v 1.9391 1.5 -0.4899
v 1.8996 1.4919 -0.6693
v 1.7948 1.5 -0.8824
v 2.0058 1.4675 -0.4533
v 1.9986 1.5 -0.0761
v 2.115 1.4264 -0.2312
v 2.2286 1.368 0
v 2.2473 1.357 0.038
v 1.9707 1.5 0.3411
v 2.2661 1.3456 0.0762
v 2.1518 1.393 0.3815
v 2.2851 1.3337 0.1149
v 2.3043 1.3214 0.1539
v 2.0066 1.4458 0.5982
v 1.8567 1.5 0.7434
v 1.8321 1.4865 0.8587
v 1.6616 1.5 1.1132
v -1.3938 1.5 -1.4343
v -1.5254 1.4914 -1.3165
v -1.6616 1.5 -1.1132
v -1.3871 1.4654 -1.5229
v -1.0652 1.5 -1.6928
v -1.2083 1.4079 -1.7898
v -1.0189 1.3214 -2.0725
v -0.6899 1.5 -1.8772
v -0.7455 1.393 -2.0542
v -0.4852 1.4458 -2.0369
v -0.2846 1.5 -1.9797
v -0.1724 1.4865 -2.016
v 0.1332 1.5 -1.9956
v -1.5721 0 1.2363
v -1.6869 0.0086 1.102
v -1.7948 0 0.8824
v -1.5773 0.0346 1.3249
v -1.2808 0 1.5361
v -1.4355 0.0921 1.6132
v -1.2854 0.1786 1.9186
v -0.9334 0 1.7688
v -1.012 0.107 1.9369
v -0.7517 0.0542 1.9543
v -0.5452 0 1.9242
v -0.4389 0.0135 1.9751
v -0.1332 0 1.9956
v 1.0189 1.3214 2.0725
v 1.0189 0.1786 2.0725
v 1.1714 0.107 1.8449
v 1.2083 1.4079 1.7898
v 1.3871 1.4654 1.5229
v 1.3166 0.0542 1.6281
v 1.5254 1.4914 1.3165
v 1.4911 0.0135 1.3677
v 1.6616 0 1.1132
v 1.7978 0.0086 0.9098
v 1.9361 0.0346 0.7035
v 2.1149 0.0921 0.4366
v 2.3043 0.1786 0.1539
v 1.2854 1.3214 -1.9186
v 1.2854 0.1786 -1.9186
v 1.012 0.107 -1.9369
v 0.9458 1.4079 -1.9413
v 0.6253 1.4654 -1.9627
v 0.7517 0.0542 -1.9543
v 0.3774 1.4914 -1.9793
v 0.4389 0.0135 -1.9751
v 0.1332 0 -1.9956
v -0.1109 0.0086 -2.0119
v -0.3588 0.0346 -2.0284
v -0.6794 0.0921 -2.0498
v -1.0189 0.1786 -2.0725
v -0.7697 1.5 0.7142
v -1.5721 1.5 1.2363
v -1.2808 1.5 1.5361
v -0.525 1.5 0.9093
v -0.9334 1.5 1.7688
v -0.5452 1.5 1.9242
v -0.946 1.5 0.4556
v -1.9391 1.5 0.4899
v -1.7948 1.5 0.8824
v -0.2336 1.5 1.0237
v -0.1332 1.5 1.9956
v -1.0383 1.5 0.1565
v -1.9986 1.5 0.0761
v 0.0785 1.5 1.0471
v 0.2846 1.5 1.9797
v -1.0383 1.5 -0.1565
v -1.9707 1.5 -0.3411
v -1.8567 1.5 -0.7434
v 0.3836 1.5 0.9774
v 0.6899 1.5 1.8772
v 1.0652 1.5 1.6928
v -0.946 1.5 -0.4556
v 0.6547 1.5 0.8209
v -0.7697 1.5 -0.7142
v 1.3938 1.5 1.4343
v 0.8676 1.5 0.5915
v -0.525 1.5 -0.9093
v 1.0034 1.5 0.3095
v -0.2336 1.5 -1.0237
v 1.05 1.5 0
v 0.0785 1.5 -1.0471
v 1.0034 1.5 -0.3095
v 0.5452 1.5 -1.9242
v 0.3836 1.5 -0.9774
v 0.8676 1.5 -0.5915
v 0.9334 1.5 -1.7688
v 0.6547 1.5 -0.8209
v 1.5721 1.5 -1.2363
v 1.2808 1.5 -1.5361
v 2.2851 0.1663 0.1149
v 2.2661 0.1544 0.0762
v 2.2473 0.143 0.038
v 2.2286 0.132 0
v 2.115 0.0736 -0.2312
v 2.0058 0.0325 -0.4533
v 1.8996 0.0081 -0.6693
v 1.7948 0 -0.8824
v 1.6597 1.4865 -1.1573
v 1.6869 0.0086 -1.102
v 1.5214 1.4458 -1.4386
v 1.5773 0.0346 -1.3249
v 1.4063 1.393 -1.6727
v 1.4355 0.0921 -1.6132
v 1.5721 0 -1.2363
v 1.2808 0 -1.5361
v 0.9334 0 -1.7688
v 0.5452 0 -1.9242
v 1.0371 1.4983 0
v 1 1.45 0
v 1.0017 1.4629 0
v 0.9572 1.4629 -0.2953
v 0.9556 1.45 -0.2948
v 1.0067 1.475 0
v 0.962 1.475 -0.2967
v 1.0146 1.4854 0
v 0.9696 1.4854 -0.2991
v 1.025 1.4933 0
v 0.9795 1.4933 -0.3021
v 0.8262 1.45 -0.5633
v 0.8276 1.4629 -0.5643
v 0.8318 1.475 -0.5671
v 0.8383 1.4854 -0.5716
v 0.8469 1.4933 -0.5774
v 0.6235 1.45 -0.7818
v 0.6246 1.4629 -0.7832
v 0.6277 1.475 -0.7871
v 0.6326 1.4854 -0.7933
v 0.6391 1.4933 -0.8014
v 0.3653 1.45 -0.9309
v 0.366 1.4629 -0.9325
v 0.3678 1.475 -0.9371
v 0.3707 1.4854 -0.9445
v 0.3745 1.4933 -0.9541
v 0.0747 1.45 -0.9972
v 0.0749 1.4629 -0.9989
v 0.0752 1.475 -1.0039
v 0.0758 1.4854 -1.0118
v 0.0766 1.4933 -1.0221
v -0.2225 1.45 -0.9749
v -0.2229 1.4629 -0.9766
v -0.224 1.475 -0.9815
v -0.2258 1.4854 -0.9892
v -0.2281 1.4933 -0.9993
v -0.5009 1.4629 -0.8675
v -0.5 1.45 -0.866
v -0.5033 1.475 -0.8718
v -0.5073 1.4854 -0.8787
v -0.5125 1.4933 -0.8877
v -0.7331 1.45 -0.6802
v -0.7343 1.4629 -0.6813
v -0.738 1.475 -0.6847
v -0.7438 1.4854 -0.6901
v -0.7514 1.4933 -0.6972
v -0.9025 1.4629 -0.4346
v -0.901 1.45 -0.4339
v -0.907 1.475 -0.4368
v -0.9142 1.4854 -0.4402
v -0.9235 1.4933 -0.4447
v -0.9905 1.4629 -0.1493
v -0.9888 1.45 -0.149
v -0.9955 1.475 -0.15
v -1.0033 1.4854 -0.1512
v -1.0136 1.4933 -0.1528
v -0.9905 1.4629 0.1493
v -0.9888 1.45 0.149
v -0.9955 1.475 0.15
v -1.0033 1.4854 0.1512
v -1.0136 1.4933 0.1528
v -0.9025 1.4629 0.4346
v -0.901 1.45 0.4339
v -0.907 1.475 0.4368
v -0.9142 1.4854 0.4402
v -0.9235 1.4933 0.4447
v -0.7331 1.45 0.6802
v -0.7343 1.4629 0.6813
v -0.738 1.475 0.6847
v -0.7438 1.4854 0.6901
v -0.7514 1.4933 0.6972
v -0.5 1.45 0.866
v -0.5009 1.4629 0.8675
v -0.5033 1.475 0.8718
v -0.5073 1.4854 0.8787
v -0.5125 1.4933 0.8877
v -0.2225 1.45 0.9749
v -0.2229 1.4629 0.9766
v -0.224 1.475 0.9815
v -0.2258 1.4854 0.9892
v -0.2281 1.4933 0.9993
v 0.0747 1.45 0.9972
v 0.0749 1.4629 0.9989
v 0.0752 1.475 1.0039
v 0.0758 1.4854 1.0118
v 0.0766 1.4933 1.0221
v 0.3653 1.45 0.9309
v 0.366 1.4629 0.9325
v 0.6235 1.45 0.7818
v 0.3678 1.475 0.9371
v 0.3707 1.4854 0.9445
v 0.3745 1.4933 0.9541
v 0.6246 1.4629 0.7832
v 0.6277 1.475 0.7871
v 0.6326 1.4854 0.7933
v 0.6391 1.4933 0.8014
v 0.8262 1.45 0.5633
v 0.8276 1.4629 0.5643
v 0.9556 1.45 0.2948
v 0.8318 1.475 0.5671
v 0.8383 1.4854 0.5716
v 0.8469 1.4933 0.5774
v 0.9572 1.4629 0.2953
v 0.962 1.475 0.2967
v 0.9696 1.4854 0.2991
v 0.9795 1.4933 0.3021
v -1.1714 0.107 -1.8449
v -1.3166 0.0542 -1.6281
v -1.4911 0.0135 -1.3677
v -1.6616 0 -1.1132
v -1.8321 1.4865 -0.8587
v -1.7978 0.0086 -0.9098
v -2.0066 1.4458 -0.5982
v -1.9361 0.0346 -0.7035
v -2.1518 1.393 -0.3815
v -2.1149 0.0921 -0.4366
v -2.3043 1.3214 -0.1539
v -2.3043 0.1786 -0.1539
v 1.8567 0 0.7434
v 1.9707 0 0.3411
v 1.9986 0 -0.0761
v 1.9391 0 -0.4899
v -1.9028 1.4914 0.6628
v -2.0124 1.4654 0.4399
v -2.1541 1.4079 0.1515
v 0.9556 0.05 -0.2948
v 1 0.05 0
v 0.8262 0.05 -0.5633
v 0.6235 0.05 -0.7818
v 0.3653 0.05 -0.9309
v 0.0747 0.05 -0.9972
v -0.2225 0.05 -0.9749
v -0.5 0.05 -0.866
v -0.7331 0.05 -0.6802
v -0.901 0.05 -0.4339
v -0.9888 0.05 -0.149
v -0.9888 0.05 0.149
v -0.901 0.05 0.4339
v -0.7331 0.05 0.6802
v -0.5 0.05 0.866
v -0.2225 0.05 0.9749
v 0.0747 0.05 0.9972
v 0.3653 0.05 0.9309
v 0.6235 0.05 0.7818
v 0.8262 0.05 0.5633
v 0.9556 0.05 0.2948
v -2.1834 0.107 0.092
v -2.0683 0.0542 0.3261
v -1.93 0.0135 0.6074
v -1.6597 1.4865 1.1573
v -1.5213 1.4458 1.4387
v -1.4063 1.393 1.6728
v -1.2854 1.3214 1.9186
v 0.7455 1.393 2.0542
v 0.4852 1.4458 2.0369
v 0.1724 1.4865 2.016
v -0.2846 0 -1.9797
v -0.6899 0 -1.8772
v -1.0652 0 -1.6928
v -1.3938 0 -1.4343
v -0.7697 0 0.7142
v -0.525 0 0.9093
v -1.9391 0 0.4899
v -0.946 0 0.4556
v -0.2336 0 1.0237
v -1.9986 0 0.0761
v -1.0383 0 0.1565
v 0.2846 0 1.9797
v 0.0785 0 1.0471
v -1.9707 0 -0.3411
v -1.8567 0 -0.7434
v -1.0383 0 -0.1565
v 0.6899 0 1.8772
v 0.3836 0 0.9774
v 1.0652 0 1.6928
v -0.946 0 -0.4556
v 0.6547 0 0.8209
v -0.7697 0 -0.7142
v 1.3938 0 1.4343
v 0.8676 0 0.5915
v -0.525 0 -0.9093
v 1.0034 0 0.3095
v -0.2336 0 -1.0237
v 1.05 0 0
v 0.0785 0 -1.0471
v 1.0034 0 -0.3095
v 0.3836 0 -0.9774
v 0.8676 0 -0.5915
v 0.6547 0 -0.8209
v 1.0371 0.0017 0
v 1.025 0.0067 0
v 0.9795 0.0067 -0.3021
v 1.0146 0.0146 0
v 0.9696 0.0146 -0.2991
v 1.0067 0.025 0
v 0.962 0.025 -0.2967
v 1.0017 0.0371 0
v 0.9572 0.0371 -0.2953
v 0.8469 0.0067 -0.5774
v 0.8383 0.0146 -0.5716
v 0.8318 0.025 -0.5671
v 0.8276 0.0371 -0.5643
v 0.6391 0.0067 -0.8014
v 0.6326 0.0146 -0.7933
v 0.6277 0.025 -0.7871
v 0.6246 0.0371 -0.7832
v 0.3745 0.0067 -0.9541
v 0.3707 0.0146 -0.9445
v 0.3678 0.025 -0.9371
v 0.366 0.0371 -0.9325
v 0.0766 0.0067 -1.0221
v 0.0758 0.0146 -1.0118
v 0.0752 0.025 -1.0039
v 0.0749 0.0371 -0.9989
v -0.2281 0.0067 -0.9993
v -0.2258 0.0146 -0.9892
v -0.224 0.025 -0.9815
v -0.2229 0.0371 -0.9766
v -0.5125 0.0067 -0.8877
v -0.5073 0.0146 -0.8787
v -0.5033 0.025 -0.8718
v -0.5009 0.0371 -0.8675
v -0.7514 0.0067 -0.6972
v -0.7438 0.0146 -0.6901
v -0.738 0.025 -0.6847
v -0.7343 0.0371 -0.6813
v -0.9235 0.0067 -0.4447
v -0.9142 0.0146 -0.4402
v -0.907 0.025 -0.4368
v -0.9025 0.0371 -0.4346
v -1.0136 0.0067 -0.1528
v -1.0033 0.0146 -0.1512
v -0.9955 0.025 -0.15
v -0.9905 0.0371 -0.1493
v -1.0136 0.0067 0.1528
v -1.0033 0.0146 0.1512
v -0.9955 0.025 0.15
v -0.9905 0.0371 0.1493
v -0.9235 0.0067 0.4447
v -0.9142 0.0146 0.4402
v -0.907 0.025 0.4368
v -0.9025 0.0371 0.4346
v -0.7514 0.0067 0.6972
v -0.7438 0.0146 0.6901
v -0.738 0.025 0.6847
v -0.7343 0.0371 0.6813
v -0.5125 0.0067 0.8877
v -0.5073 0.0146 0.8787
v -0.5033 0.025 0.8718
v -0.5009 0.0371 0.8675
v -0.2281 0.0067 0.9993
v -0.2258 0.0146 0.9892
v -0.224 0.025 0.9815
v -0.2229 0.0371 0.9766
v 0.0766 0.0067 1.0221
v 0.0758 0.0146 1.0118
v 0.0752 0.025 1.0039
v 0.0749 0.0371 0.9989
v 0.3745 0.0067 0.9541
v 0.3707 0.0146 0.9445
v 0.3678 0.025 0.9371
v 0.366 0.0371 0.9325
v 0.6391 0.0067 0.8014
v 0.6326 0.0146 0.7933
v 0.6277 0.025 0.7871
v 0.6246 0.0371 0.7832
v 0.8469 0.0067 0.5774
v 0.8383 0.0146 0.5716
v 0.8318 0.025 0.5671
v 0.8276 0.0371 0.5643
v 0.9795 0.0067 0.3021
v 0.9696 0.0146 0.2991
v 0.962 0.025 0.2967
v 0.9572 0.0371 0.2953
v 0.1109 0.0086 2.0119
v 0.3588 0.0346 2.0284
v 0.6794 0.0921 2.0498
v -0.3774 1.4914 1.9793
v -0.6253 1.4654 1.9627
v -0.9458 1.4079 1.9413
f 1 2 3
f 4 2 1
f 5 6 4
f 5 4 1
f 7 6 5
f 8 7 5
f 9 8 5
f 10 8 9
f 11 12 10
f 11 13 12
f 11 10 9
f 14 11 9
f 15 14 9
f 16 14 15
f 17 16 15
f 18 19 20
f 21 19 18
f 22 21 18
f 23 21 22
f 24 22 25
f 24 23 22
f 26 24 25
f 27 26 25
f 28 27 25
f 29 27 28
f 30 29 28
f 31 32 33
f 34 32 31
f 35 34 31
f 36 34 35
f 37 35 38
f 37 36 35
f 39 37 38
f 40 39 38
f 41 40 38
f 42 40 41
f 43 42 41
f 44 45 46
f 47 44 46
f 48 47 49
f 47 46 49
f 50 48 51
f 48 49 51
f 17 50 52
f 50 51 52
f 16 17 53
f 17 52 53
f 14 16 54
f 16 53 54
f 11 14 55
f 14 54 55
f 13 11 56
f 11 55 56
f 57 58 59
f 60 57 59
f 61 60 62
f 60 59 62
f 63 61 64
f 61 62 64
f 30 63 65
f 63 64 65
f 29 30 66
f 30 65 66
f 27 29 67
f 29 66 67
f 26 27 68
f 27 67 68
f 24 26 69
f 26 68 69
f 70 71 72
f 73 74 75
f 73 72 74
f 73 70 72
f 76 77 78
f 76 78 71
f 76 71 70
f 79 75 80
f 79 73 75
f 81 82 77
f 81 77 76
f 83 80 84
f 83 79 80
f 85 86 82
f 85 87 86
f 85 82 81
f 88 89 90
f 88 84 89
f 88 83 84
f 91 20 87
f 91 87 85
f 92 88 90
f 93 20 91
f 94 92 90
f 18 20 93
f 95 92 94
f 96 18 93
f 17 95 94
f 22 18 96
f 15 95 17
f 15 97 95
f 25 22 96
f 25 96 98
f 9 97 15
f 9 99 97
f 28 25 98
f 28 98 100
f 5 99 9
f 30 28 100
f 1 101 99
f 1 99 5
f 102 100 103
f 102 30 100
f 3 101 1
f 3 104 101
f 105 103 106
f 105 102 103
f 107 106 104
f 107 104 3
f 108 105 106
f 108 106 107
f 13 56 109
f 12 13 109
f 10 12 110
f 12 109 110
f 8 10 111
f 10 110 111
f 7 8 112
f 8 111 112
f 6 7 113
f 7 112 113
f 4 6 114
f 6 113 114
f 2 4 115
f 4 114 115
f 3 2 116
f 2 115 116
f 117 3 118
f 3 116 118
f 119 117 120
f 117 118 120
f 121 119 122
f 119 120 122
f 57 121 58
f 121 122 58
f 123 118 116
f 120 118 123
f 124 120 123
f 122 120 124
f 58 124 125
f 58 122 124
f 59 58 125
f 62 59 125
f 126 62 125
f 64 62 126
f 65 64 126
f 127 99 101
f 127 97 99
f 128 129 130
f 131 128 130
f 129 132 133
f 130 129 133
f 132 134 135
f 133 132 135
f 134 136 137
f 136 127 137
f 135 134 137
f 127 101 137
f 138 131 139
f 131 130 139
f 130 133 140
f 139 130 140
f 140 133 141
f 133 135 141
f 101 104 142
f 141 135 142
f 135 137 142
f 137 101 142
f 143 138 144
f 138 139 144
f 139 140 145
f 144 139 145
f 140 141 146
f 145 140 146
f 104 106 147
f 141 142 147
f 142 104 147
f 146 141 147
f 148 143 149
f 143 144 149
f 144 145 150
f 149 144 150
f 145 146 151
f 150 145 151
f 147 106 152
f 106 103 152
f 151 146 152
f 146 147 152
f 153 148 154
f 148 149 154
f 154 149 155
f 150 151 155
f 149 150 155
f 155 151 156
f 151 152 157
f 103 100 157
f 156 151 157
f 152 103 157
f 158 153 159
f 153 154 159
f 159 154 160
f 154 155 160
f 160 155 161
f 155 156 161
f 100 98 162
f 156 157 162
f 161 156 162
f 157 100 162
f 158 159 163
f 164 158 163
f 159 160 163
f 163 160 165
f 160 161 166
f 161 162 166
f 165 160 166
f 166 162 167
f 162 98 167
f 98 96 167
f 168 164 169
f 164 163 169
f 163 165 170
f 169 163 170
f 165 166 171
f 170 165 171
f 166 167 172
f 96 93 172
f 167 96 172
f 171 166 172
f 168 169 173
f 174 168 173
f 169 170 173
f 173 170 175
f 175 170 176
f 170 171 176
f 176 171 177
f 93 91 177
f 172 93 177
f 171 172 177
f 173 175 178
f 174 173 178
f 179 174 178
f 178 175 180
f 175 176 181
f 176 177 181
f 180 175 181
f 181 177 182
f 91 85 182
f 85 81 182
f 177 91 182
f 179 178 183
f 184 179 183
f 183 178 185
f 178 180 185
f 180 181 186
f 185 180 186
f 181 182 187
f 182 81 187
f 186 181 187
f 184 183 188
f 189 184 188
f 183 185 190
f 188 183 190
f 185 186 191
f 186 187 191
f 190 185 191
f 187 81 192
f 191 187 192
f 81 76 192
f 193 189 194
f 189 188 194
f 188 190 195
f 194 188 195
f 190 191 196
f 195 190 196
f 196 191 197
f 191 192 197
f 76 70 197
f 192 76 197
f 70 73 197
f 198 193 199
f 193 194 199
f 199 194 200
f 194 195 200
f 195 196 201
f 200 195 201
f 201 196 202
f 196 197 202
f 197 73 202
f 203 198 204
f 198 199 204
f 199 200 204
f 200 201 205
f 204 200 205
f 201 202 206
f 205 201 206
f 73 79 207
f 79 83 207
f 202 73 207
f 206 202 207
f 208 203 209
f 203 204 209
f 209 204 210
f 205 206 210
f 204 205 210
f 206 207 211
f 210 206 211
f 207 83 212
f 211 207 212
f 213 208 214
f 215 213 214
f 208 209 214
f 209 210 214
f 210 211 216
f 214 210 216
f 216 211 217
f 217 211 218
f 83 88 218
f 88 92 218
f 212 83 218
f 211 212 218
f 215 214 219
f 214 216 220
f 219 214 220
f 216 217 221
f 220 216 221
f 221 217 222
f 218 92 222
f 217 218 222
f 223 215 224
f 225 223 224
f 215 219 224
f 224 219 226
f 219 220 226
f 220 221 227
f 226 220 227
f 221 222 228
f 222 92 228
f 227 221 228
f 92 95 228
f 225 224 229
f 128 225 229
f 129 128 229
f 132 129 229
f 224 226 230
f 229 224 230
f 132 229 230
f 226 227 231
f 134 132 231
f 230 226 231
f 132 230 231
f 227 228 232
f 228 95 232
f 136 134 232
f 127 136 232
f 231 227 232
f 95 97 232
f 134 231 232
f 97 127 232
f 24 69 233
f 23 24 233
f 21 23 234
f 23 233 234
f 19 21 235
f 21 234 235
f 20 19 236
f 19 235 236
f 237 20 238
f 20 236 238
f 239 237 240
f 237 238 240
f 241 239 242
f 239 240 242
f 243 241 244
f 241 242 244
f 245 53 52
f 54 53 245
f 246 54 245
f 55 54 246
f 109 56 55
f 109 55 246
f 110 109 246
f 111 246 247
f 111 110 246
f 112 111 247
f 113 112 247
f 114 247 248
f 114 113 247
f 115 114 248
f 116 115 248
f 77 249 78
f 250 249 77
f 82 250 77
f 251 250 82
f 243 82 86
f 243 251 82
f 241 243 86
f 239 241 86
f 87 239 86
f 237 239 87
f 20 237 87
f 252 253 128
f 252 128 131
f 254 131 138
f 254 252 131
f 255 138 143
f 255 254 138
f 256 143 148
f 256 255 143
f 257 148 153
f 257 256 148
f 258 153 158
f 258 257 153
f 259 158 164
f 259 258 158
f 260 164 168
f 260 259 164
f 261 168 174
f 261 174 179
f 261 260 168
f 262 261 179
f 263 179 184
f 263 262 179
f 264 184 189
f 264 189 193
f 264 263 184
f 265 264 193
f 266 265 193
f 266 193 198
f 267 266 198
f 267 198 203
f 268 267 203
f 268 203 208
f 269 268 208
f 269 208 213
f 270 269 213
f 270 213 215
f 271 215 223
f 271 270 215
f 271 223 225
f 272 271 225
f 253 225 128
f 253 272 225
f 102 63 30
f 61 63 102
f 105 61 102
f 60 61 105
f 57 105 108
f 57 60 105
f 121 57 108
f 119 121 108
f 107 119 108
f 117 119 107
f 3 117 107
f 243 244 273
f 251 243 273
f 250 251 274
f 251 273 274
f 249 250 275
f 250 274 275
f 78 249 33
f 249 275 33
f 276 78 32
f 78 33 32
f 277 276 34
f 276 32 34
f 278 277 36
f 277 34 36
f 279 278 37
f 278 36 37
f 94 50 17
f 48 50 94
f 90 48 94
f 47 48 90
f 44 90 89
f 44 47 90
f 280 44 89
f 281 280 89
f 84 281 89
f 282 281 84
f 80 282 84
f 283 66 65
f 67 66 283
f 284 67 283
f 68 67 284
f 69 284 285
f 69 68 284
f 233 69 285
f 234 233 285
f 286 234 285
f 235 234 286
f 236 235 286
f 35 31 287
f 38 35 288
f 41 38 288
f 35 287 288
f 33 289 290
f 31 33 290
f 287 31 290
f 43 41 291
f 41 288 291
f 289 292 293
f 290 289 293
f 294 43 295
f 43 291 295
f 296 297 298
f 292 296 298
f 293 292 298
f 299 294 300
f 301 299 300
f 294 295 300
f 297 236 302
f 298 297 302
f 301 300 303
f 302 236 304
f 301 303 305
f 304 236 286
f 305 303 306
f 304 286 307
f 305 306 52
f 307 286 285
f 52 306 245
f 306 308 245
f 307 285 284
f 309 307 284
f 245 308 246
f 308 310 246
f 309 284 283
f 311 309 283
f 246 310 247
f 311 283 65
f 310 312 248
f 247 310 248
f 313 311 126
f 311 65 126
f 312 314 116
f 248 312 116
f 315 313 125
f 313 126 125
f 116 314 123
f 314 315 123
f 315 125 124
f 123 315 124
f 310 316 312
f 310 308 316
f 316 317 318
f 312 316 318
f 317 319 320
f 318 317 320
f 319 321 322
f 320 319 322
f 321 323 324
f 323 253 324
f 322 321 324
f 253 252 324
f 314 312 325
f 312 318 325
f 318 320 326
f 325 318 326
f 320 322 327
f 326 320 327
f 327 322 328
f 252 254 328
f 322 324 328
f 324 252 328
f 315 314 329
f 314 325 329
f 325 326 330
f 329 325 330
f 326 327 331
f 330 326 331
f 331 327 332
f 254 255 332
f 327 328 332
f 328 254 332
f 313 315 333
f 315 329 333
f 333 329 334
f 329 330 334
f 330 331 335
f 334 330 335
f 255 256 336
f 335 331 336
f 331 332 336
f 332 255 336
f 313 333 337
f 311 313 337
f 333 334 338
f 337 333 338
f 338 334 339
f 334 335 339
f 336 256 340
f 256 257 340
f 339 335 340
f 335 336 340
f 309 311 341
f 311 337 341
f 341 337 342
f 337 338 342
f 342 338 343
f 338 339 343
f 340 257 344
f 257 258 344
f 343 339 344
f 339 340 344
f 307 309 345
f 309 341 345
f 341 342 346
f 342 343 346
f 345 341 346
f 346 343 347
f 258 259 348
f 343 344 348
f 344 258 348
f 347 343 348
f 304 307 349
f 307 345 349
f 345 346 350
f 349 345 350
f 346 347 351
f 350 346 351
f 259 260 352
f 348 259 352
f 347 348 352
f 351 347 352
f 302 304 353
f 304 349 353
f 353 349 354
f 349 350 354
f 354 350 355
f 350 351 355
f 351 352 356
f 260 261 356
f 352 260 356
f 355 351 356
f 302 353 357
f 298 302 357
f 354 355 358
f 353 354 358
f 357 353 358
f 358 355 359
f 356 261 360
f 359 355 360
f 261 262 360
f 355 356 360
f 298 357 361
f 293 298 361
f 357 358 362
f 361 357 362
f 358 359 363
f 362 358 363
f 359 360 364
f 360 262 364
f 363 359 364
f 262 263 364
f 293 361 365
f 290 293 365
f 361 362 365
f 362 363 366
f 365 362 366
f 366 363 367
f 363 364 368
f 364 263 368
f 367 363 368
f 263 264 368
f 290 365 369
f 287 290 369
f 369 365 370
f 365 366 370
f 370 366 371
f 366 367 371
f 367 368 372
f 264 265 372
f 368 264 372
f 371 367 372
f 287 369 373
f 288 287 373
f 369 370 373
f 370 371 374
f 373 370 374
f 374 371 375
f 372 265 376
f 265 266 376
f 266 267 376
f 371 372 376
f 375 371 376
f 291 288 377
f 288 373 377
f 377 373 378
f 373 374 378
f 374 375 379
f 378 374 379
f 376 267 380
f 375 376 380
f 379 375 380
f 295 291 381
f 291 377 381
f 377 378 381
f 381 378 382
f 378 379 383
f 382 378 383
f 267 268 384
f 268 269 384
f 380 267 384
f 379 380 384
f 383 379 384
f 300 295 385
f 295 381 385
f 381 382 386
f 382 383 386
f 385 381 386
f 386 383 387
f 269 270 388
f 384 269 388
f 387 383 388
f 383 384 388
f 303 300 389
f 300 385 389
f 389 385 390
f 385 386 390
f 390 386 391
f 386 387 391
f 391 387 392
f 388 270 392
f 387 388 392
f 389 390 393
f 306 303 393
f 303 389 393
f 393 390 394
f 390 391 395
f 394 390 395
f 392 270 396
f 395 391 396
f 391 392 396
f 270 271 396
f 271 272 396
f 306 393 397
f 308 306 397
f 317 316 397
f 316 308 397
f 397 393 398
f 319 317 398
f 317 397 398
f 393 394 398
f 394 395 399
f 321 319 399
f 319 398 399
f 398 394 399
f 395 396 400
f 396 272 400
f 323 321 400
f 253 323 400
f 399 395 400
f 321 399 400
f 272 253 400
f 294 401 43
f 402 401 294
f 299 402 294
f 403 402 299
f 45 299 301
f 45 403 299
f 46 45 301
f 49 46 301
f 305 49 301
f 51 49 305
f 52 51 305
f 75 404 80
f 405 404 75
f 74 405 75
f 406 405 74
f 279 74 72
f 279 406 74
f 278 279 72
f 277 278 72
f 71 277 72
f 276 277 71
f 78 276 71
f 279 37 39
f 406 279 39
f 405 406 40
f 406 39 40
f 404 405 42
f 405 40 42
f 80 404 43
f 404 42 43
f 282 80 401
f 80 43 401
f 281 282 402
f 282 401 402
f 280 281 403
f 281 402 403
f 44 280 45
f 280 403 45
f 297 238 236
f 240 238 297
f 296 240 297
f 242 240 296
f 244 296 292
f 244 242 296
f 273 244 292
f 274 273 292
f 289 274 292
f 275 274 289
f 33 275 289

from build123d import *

# Parameters (mm, degrees)
SKETCH1_R           = 1
BOSS_EXTRUDE1_DEPTH = 1.5
SKETCH2_OUTSIDE_W   = 14.812
SKETCH2_OUTSIDE_H   = 14.348
SKETCH2_OUTSIDE_R   = 2
CUT_EXTRUDE1_DEPTH  = 2
CUT_EXTRUDE1_TAPER  = 60
SKETCH3_OUTSIDE_W   = 14.812
SKETCH3_OUTSIDE_H   = 14.348
SKETCH3_OUTSIDE_R   = 2
CUT_EXTRUDE2_DEPTH  = 2
CUT_EXTRUDE2_TAPER  = 60
FILLET1_R           = 0.05


with BuildPart() as part:
    # Sketch1 → Boss-Extrude1 (new body)
    with BuildSketch(Plane(origin=(0, 0, 0), x_dir=(1, 0, 0), z_dir=(0, 1, 0))):
        Polygon((-2.304270274, 0.153856556), (-1.285378822, -1.918628316), (1.018891451, -2.072484872), (2.304270274, -0.153856556), (1.285378822, 1.918628316), (-1.018891451, 2.072484872), align=None)
        Circle(SKETCH1_R, mode=Mode.SUBTRACT)
    extrude(amount=BOSS_EXTRUDE1_DEPTH)

    # Sketch2 outside → Cut-Extrude1 (cut)
    with BuildSketch(Plane(origin=(0, 1.5, 0), x_dir=(1, 0, 0), z_dir=(0, 1, 0))):
        Rectangle(SKETCH2_OUTSIDE_W, SKETCH2_OUTSIDE_H)
        Circle(SKETCH2_OUTSIDE_R, mode=Mode.SUBTRACT)
    extrude(amount=-CUT_EXTRUDE1_DEPTH, taper=CUT_EXTRUDE1_TAPER, mode=Mode.SUBTRACT)

    # Sketch3 outside → Cut-Extrude2 (cut)
    with BuildSketch(Plane.XZ):
        Rectangle(SKETCH3_OUTSIDE_W, SKETCH3_OUTSIDE_H)
        Circle(SKETCH3_OUTSIDE_R, mode=Mode.SUBTRACT)
    extrude(amount=-CUT_EXTRUDE2_DEPTH, taper=CUT_EXTRUDE2_TAPER, mode=Mode.SUBTRACT)

    # Fillet1
    fillet1_edges = [part.edges().sort_by_distance(p)[0] for p in [
        (-1, 0, 0),
        (-1, 1.5, 0),
    ]]
    fillet(fillet1_edges, radius=FILLET1_R)


solid = part.part
